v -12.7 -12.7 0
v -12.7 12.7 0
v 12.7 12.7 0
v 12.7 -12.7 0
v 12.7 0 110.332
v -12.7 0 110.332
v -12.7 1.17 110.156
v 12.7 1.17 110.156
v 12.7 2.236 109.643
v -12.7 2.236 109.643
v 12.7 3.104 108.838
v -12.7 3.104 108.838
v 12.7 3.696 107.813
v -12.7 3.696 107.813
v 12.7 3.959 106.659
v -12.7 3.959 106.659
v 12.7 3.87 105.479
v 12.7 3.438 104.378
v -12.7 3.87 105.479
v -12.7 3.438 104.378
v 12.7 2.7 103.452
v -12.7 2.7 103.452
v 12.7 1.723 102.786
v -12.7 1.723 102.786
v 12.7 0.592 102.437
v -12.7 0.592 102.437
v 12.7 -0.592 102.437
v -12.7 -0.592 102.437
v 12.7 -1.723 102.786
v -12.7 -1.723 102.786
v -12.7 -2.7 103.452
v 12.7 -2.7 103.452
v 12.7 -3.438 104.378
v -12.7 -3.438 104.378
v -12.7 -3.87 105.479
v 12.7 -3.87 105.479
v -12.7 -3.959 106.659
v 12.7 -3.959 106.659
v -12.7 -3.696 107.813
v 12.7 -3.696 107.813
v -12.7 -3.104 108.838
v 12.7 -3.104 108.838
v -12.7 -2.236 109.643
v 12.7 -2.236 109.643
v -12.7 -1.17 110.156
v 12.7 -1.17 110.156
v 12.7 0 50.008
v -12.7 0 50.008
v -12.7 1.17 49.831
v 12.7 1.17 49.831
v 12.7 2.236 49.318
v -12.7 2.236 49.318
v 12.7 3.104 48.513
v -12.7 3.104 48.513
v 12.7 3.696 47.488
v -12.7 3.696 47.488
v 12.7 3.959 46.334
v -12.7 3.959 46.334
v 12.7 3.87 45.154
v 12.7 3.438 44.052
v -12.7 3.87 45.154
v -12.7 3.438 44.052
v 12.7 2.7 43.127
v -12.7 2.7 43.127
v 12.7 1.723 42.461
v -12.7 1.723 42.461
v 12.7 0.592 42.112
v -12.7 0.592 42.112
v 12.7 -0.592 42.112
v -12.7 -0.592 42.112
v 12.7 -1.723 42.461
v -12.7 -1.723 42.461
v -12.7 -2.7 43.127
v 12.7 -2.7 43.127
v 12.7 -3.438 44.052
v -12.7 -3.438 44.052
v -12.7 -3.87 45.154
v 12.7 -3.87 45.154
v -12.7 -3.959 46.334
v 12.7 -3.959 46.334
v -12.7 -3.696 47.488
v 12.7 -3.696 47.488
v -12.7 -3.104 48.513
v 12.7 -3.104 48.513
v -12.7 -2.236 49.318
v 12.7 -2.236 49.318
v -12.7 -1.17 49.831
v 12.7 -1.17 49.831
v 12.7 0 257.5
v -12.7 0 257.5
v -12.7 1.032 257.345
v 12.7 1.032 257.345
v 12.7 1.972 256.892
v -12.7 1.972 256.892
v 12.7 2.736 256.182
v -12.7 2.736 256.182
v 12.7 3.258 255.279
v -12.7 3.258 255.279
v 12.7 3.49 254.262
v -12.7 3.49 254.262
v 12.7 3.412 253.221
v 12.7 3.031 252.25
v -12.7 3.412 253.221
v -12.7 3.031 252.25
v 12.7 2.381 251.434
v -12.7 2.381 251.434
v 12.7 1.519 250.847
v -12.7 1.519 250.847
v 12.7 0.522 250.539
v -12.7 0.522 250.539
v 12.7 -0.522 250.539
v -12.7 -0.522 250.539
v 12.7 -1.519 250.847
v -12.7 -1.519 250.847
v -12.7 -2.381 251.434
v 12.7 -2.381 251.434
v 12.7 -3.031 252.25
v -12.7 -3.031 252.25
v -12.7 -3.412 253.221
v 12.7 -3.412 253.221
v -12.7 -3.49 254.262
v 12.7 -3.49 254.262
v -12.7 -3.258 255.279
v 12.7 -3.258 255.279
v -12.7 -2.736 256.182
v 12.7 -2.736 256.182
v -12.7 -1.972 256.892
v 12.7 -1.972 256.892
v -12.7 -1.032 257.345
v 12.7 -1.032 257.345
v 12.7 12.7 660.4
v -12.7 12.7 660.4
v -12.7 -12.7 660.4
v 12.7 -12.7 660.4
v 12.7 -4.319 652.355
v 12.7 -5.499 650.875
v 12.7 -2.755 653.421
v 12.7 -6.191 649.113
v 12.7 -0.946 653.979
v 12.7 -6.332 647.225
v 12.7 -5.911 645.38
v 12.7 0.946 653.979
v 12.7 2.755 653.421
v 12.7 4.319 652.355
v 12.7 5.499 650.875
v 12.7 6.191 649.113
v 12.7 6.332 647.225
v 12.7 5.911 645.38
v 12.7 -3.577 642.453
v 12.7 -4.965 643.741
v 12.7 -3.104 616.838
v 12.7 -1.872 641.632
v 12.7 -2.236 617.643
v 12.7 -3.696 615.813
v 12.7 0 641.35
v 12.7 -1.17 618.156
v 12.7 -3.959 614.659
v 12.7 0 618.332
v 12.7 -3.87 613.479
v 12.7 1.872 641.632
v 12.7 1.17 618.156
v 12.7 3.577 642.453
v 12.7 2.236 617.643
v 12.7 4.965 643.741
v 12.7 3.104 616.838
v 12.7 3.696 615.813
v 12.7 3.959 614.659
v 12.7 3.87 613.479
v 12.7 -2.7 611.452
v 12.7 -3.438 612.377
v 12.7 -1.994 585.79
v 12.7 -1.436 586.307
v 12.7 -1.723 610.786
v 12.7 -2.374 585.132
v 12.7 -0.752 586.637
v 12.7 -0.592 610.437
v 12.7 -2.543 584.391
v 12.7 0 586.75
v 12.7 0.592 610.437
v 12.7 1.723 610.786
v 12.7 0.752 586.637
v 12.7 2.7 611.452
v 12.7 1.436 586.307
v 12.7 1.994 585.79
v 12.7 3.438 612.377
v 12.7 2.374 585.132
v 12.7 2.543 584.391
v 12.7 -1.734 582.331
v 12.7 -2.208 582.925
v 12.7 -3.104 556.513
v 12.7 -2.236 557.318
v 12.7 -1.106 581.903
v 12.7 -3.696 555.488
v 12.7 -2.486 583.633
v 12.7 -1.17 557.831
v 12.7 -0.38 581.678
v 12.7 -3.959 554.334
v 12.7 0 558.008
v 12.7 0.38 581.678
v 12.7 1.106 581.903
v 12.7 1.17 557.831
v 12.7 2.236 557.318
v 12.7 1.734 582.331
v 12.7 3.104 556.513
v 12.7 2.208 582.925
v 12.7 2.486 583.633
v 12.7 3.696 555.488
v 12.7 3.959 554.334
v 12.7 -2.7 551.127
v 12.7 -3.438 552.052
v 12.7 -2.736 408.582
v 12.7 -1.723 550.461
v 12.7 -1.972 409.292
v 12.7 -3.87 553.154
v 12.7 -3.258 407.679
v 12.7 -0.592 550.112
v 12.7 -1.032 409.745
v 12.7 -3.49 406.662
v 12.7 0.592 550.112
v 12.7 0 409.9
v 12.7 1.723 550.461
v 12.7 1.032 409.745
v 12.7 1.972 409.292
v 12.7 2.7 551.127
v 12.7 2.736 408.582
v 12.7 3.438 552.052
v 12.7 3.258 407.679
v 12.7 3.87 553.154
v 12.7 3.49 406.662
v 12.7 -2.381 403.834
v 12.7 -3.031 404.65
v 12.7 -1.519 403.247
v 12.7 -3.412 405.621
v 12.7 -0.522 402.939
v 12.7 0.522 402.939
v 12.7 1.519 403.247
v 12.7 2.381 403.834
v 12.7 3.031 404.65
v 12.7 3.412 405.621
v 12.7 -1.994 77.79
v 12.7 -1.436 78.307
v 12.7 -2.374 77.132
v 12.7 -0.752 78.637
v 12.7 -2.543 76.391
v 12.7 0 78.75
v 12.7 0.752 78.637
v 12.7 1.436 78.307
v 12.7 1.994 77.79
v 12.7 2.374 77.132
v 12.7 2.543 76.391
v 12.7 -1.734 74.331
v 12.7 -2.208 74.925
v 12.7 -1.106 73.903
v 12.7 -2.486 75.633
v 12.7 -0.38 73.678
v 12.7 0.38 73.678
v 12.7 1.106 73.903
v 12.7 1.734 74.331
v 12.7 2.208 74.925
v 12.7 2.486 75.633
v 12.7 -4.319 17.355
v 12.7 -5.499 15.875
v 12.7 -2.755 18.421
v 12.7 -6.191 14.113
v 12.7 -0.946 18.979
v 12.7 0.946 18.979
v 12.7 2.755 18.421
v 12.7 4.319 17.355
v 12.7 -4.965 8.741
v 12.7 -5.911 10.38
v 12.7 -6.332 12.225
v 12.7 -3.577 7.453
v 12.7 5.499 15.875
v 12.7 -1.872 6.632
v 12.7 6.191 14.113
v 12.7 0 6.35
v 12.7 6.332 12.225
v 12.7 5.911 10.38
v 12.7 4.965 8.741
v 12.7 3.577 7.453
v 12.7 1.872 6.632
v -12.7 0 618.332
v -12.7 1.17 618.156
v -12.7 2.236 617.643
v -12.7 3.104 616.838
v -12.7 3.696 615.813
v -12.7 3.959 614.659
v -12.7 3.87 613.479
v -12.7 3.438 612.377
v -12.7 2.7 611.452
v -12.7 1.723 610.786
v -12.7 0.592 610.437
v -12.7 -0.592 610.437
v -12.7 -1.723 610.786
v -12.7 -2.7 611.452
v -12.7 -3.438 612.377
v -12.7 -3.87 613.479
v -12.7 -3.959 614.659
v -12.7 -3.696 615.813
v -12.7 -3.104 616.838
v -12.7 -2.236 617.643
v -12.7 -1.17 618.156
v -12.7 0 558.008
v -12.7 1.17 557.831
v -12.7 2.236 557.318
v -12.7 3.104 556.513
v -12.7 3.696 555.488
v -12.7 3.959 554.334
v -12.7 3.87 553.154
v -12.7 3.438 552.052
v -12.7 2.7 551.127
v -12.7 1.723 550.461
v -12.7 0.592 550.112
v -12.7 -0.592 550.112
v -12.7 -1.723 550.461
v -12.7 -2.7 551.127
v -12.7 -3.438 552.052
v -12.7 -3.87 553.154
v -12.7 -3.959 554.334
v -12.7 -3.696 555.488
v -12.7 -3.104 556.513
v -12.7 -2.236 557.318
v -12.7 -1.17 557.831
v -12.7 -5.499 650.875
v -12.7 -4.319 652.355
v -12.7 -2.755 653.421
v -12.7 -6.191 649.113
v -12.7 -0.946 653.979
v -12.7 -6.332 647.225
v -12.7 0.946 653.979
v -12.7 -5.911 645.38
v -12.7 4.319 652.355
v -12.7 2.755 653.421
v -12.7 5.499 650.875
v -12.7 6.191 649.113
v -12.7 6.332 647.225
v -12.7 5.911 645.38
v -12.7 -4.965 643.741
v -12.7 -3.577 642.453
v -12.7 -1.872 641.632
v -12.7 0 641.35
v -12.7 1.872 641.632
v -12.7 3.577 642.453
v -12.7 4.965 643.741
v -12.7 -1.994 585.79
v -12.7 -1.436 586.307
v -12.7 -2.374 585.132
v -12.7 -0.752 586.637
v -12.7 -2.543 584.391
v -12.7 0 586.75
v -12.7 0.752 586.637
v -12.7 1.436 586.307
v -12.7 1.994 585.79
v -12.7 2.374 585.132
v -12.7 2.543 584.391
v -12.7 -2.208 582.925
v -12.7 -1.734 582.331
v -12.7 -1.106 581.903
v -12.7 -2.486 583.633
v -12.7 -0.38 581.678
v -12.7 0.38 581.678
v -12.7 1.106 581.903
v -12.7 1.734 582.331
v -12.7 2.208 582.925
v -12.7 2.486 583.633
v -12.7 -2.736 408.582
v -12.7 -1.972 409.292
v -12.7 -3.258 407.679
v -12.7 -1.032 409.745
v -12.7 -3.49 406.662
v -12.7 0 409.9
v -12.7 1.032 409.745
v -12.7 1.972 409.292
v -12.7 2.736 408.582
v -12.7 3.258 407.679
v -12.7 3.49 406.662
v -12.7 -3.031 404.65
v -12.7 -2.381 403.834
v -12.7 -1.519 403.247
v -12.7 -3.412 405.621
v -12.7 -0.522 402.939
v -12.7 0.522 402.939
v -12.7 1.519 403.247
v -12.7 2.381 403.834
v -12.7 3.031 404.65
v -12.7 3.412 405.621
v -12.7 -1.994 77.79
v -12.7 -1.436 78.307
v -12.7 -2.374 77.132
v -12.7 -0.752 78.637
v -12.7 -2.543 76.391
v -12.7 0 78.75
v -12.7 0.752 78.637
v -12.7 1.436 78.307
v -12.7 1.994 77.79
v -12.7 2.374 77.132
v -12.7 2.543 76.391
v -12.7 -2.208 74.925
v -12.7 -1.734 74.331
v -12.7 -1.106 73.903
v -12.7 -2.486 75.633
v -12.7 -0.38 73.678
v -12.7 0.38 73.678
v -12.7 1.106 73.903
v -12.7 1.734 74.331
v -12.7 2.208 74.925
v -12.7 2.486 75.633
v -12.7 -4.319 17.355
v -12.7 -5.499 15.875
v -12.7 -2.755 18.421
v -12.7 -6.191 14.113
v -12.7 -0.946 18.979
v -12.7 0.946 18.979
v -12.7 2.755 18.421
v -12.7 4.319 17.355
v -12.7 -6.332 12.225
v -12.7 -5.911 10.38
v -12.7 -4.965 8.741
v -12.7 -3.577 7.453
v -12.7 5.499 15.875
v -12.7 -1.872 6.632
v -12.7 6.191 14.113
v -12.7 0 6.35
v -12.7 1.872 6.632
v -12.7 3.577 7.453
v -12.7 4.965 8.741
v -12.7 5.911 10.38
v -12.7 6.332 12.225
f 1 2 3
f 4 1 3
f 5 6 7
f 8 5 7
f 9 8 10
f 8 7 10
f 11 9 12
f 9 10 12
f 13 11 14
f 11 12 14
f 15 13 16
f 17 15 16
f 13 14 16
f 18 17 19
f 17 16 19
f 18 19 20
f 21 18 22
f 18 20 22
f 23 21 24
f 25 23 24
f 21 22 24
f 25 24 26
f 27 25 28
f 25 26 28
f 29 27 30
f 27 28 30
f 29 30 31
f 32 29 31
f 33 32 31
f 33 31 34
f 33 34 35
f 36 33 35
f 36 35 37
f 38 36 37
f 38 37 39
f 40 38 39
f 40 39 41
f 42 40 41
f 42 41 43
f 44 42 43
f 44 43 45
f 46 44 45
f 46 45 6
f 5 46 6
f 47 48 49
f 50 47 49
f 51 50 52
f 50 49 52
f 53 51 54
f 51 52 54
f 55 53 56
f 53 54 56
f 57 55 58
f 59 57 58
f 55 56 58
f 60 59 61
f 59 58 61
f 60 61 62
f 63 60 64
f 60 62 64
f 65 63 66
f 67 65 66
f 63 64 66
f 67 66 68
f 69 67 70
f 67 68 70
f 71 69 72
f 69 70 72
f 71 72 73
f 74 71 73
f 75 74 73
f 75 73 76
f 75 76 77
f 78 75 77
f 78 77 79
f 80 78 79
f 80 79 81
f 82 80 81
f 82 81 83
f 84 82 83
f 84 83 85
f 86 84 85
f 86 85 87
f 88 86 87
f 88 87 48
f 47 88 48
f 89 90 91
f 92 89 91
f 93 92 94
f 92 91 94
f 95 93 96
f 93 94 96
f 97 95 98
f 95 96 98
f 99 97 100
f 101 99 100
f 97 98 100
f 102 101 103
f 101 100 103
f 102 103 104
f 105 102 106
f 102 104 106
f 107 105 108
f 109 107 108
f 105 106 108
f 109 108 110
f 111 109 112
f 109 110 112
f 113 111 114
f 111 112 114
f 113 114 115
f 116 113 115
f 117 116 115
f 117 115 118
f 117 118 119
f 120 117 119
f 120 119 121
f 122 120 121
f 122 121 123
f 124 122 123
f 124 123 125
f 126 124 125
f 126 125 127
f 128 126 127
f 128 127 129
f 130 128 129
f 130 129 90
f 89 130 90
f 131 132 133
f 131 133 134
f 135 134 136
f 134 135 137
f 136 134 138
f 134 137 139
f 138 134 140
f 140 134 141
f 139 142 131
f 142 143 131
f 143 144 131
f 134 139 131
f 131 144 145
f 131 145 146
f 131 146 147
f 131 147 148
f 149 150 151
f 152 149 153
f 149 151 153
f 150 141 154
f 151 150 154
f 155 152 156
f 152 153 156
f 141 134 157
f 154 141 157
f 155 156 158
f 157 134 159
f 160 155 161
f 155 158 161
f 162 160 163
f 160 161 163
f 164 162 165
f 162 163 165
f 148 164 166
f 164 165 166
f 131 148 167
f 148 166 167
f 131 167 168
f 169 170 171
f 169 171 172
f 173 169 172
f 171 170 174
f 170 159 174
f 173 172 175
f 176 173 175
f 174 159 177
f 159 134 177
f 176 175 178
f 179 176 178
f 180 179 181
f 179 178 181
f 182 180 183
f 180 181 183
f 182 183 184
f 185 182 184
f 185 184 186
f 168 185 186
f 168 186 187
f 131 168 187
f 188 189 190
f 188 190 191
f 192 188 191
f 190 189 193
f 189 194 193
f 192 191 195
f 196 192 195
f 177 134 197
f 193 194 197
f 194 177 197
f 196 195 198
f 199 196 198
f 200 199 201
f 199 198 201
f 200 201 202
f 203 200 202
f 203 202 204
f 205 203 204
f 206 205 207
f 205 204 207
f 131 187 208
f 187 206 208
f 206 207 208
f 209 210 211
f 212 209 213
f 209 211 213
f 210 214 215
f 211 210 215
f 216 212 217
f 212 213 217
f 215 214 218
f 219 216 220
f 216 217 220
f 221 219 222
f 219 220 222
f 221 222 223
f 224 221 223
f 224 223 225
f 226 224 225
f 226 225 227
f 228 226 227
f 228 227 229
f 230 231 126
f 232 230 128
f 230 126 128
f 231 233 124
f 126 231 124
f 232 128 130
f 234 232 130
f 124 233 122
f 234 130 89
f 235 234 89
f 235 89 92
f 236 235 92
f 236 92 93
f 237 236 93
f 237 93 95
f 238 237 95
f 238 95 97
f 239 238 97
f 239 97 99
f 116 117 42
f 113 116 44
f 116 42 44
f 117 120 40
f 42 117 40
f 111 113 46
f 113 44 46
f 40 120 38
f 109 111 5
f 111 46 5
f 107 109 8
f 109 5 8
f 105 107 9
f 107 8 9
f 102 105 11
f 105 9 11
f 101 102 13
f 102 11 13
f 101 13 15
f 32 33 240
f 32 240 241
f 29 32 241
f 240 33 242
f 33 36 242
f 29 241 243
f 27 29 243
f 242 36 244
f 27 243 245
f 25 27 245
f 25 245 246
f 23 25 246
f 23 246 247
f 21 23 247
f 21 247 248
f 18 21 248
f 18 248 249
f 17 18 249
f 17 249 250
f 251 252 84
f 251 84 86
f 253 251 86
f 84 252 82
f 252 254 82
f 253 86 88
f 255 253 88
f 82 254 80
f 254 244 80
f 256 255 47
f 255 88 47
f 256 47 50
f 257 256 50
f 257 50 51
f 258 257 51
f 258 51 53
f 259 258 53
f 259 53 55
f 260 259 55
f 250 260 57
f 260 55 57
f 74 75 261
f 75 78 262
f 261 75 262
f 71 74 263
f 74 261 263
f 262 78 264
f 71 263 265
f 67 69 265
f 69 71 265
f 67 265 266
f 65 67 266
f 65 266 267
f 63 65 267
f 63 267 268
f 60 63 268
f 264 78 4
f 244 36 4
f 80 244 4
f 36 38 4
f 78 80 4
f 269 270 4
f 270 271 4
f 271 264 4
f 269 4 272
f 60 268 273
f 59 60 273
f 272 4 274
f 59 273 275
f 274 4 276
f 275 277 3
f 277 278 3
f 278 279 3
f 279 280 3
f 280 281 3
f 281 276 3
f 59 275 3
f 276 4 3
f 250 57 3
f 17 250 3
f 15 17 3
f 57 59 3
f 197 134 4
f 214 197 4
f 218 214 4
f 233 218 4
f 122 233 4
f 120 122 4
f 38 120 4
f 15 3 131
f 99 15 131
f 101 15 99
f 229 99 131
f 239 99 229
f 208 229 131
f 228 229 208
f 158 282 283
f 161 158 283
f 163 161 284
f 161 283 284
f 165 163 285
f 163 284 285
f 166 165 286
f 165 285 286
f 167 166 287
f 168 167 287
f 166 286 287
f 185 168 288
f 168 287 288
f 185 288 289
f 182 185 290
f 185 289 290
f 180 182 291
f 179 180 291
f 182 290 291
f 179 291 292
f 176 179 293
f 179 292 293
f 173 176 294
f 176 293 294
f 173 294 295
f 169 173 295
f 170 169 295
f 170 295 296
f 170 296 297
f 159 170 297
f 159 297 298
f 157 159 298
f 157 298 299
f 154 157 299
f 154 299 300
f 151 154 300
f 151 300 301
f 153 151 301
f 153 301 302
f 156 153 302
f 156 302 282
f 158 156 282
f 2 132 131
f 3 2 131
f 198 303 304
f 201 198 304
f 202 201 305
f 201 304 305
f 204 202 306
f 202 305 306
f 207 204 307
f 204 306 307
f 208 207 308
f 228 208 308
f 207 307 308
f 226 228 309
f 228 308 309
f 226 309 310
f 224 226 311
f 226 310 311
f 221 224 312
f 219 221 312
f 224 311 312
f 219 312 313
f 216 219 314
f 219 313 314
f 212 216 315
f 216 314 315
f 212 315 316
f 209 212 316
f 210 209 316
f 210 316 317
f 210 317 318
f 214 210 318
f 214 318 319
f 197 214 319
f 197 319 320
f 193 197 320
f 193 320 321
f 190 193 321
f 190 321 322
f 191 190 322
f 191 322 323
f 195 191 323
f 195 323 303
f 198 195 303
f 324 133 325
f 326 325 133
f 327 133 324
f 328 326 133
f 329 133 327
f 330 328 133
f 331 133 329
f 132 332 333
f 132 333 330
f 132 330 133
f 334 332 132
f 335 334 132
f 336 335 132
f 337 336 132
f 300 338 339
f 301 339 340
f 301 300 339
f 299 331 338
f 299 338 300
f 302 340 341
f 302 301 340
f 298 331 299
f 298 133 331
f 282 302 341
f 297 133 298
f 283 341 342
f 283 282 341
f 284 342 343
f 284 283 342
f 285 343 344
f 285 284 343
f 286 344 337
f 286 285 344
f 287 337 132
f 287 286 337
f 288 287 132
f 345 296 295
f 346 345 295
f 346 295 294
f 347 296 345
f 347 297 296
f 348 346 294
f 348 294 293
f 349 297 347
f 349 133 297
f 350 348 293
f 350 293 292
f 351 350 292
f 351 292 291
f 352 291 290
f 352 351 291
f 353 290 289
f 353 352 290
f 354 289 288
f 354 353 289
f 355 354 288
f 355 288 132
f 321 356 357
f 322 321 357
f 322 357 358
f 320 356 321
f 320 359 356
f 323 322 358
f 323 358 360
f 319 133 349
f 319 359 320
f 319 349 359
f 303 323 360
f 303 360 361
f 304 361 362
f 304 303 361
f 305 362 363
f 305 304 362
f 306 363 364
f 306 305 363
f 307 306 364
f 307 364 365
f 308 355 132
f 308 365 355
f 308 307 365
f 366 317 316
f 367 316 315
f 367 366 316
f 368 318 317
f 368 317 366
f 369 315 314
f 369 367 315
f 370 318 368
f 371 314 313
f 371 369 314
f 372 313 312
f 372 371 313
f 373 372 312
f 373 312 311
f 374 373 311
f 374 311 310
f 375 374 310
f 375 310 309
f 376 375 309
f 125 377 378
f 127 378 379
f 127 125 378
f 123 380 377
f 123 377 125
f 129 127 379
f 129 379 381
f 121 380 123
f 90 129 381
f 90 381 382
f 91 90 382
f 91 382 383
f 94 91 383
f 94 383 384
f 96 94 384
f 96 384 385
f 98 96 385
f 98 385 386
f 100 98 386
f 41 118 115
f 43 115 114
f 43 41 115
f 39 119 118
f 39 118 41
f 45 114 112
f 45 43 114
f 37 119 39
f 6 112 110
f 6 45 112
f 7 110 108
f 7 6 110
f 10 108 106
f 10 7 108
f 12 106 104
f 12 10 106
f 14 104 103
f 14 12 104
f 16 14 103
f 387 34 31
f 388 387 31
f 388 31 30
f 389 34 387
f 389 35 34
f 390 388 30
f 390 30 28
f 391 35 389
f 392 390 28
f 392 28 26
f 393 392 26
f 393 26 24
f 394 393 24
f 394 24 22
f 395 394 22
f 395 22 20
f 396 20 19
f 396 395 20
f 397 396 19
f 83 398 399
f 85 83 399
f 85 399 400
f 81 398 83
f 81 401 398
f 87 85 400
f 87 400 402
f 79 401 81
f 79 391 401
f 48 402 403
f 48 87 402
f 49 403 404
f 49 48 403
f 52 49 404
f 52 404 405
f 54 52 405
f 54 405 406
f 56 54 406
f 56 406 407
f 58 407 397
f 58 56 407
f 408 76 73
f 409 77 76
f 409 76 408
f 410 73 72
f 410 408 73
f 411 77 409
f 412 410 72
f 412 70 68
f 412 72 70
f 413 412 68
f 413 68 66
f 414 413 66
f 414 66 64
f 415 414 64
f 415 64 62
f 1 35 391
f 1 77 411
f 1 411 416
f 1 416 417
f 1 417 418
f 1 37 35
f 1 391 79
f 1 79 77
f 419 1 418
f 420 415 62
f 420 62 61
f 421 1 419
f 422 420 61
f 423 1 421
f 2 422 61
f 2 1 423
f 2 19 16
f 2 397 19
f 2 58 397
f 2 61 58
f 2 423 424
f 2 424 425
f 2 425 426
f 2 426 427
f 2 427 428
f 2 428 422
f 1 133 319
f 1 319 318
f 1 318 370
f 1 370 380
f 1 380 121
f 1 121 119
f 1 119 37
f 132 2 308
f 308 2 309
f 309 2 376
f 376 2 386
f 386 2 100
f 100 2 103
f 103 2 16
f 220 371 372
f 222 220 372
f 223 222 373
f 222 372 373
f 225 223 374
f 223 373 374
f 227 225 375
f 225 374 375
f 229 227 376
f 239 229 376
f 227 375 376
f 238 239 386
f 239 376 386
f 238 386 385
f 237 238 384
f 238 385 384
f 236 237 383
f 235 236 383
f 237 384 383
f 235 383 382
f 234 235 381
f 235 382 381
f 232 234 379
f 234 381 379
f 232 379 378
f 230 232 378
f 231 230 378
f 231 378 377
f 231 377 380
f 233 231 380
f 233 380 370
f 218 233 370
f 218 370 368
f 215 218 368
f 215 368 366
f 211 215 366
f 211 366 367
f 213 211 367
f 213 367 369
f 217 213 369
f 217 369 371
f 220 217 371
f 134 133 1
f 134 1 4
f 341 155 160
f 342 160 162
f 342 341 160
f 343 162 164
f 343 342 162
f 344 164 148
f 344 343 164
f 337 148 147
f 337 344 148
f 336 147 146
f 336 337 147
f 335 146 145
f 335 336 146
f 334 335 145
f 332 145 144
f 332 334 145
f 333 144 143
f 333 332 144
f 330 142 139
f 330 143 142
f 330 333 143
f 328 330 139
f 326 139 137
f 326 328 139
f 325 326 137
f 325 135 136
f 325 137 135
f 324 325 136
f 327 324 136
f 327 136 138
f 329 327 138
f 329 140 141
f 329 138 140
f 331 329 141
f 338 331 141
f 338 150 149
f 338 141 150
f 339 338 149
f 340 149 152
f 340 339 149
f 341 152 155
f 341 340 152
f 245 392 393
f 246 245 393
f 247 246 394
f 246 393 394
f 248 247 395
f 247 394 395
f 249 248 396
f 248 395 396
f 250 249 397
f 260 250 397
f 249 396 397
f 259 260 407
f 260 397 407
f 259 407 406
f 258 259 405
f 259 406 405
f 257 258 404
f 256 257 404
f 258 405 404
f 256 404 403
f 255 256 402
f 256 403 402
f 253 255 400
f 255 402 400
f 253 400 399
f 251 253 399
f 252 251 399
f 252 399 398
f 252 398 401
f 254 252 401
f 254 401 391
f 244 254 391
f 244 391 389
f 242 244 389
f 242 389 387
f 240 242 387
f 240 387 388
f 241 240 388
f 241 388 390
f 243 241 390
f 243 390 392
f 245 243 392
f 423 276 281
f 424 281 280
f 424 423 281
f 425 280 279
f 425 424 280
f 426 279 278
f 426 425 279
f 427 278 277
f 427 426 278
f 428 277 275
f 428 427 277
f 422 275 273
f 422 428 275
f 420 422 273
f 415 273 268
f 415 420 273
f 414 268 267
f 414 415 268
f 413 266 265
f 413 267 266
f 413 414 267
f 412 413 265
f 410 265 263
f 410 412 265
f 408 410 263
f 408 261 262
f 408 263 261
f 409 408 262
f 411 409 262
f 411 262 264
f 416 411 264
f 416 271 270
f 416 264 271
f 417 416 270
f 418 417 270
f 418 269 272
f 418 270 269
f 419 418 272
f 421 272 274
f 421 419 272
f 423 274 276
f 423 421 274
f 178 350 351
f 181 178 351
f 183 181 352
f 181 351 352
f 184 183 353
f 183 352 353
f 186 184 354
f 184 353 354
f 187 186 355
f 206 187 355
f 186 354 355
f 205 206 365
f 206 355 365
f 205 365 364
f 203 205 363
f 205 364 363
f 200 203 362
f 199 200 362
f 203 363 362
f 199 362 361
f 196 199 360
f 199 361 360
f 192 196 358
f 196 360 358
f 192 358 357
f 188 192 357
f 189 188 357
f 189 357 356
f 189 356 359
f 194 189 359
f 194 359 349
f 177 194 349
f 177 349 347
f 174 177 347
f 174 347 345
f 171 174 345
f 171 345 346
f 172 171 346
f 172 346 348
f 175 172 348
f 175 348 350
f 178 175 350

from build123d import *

# Parameters (mm, degrees)
SKETCH1_W               = 25.4
SKETCH1_H               = 25.4
BOSS_EXTRUDE1_DEPTH     = 660.4
SKETCH2_R               = 6.35
CUT_EXTRUDE4_DEPTH      = 26.4
CUT_EXTRUDE4_DEPTH_BACK = 1
SKETCH3_R               = 3.97
SKETCH3_R_2             = 2.55
CUT_EXTRUDE5_DEPTH      = 26.4
SKETCH10_R              = 3.5
CUT_EXTRUDE6_DEPTH      = 26.4


with BuildPart() as part:
    # Sketch1 → Boss-Extrude1 (new body)
    with BuildSketch(Plane.XY):
        Rectangle(SKETCH1_W, SKETCH1_H)
    extrude(amount=BOSS_EXTRUDE1_DEPTH)

    # Sketch2 → Cut-Extrude4 (cut, two sides)
    with BuildSketch(Plane(origin=(-12.7, 0, 0), x_dir=(0, 0, -1), z_dir=(1, 0, 0))) as cut_extrude4_sk:
        with Locations((-12.7, 0)):
            Circle(SKETCH2_R)
        with Locations((-647.7, 0)):
            Circle(SKETCH2_R)
    extrude(amount=CUT_EXTRUDE4_DEPTH, mode=Mode.SUBTRACT)
    extrude(cut_extrude4_sk.sketch, amount=-CUT_EXTRUDE4_DEPTH_BACK, mode=Mode.SUBTRACT)

    # Sketch3 → Cut-Extrude5 (cut, through all)
    with BuildSketch(Plane.ZY.offset(12.7)):
        with Locations((554.0375, 0)):
            Circle(SKETCH3_R)
        with Locations((106.3625, 0)):
            Circle(SKETCH3_R)
        with Locations((614.3625, 0)):
            Circle(SKETCH3_R)
        with Locations((584.2, 0)):
            Circle(SKETCH3_R_2)
        with Locations((46.0375, 0)):
            Circle(SKETCH3_R)
        with Locations((76.2, 0)):
            Circle(SKETCH3_R_2)
    extrude(amount=-CUT_EXTRUDE5_DEPTH, mode=Mode.SUBTRACT)

    # Sketch10 → Cut-Extrude6 (cut, through all)
    with BuildSketch(Plane.ZY.offset(12.7)):
        with Locations((406.4, 0)):
            Circle(SKETCH10_R)
        with Locations((254, 0)):
            Circle(SKETCH10_R)
    extrude(amount=-CUT_EXTRUDE6_DEPTH, mode=Mode.SUBTRACT)


solid = part.part
